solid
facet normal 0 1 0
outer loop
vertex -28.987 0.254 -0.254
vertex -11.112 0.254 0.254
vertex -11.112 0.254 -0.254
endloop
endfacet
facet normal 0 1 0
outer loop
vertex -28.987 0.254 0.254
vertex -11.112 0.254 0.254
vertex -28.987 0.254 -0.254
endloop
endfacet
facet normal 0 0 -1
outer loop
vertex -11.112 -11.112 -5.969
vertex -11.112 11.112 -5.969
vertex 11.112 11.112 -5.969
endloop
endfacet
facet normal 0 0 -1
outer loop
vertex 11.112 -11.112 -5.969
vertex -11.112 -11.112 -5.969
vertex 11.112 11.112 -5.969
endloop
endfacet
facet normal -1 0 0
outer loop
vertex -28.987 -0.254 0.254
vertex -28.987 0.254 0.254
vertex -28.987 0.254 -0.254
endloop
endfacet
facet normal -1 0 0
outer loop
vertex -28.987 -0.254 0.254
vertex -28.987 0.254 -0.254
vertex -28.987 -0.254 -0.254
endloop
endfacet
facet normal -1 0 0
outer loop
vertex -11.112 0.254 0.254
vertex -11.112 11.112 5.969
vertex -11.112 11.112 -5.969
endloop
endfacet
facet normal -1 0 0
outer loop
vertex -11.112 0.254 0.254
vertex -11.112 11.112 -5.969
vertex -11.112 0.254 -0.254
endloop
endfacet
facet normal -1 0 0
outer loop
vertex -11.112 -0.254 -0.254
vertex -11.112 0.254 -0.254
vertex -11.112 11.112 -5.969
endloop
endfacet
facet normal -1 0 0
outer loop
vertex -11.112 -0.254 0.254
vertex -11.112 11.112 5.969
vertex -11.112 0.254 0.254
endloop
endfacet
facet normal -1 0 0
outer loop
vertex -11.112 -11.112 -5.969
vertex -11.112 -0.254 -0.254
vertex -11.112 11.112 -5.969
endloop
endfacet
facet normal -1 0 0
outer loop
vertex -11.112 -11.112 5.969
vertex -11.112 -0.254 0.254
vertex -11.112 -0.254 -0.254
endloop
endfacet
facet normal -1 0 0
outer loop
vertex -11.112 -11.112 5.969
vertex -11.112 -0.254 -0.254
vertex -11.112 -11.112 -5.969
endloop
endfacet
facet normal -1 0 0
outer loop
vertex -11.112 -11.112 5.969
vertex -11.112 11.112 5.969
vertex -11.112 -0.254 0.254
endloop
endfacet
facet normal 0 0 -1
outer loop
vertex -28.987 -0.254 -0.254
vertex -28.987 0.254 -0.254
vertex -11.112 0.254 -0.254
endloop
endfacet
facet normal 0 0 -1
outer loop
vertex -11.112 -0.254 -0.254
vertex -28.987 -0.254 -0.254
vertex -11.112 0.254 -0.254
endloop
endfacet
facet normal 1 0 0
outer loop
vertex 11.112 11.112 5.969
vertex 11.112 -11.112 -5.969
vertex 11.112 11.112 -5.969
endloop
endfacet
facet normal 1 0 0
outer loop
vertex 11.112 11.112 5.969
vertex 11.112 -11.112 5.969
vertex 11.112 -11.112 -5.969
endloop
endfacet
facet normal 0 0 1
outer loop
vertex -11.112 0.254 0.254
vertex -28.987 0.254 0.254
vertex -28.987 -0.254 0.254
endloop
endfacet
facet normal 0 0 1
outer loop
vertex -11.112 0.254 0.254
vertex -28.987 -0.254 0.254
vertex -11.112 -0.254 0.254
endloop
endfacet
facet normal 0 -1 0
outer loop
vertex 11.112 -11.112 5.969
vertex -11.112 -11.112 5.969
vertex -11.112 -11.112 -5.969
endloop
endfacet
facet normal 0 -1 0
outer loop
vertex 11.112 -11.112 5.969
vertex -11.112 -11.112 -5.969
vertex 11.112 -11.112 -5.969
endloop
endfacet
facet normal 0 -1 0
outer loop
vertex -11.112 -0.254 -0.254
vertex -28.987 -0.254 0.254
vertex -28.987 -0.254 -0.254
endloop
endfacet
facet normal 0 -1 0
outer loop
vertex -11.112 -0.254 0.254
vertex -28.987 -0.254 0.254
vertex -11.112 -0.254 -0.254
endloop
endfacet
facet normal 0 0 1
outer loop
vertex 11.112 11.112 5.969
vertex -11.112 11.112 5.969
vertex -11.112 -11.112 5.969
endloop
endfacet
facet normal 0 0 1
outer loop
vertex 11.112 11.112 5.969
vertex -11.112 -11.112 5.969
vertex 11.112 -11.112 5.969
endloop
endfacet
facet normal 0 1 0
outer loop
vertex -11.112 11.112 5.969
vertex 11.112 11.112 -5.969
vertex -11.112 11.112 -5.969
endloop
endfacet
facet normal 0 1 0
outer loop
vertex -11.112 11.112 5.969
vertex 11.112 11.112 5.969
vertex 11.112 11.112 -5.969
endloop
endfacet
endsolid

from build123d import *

# Parameters (mm, degrees)
F1_DEPTH = 5.969
F2_DEPTH = 0.254


with BuildPart() as f1:
    # F0 (on Top) → F1 (new body, symmetric)
    with BuildSketch(Plane.XY):
        Polygon((11.1125, 11.1125), (-11.1125, 11.1125), (-11.1125, 0.254), (-11.1125, -0.254), (-11.1125, -11.1125), (11.1125, -11.1125), align=None)
    extrude(amount=F1_DEPTH, both=True)

    # F0 (on Top) → F2 (join, symmetric)
    with BuildSketch(Plane.XY):
        Polygon((-11.1125, -0.254), (-11.1125, 0.254), (-28.986987, 0.254), (-28.986987, 0), (-28.986987, -0.254), align=None)
    extrude(amount=F2_DEPTH, both=True)


solid = f1.part
